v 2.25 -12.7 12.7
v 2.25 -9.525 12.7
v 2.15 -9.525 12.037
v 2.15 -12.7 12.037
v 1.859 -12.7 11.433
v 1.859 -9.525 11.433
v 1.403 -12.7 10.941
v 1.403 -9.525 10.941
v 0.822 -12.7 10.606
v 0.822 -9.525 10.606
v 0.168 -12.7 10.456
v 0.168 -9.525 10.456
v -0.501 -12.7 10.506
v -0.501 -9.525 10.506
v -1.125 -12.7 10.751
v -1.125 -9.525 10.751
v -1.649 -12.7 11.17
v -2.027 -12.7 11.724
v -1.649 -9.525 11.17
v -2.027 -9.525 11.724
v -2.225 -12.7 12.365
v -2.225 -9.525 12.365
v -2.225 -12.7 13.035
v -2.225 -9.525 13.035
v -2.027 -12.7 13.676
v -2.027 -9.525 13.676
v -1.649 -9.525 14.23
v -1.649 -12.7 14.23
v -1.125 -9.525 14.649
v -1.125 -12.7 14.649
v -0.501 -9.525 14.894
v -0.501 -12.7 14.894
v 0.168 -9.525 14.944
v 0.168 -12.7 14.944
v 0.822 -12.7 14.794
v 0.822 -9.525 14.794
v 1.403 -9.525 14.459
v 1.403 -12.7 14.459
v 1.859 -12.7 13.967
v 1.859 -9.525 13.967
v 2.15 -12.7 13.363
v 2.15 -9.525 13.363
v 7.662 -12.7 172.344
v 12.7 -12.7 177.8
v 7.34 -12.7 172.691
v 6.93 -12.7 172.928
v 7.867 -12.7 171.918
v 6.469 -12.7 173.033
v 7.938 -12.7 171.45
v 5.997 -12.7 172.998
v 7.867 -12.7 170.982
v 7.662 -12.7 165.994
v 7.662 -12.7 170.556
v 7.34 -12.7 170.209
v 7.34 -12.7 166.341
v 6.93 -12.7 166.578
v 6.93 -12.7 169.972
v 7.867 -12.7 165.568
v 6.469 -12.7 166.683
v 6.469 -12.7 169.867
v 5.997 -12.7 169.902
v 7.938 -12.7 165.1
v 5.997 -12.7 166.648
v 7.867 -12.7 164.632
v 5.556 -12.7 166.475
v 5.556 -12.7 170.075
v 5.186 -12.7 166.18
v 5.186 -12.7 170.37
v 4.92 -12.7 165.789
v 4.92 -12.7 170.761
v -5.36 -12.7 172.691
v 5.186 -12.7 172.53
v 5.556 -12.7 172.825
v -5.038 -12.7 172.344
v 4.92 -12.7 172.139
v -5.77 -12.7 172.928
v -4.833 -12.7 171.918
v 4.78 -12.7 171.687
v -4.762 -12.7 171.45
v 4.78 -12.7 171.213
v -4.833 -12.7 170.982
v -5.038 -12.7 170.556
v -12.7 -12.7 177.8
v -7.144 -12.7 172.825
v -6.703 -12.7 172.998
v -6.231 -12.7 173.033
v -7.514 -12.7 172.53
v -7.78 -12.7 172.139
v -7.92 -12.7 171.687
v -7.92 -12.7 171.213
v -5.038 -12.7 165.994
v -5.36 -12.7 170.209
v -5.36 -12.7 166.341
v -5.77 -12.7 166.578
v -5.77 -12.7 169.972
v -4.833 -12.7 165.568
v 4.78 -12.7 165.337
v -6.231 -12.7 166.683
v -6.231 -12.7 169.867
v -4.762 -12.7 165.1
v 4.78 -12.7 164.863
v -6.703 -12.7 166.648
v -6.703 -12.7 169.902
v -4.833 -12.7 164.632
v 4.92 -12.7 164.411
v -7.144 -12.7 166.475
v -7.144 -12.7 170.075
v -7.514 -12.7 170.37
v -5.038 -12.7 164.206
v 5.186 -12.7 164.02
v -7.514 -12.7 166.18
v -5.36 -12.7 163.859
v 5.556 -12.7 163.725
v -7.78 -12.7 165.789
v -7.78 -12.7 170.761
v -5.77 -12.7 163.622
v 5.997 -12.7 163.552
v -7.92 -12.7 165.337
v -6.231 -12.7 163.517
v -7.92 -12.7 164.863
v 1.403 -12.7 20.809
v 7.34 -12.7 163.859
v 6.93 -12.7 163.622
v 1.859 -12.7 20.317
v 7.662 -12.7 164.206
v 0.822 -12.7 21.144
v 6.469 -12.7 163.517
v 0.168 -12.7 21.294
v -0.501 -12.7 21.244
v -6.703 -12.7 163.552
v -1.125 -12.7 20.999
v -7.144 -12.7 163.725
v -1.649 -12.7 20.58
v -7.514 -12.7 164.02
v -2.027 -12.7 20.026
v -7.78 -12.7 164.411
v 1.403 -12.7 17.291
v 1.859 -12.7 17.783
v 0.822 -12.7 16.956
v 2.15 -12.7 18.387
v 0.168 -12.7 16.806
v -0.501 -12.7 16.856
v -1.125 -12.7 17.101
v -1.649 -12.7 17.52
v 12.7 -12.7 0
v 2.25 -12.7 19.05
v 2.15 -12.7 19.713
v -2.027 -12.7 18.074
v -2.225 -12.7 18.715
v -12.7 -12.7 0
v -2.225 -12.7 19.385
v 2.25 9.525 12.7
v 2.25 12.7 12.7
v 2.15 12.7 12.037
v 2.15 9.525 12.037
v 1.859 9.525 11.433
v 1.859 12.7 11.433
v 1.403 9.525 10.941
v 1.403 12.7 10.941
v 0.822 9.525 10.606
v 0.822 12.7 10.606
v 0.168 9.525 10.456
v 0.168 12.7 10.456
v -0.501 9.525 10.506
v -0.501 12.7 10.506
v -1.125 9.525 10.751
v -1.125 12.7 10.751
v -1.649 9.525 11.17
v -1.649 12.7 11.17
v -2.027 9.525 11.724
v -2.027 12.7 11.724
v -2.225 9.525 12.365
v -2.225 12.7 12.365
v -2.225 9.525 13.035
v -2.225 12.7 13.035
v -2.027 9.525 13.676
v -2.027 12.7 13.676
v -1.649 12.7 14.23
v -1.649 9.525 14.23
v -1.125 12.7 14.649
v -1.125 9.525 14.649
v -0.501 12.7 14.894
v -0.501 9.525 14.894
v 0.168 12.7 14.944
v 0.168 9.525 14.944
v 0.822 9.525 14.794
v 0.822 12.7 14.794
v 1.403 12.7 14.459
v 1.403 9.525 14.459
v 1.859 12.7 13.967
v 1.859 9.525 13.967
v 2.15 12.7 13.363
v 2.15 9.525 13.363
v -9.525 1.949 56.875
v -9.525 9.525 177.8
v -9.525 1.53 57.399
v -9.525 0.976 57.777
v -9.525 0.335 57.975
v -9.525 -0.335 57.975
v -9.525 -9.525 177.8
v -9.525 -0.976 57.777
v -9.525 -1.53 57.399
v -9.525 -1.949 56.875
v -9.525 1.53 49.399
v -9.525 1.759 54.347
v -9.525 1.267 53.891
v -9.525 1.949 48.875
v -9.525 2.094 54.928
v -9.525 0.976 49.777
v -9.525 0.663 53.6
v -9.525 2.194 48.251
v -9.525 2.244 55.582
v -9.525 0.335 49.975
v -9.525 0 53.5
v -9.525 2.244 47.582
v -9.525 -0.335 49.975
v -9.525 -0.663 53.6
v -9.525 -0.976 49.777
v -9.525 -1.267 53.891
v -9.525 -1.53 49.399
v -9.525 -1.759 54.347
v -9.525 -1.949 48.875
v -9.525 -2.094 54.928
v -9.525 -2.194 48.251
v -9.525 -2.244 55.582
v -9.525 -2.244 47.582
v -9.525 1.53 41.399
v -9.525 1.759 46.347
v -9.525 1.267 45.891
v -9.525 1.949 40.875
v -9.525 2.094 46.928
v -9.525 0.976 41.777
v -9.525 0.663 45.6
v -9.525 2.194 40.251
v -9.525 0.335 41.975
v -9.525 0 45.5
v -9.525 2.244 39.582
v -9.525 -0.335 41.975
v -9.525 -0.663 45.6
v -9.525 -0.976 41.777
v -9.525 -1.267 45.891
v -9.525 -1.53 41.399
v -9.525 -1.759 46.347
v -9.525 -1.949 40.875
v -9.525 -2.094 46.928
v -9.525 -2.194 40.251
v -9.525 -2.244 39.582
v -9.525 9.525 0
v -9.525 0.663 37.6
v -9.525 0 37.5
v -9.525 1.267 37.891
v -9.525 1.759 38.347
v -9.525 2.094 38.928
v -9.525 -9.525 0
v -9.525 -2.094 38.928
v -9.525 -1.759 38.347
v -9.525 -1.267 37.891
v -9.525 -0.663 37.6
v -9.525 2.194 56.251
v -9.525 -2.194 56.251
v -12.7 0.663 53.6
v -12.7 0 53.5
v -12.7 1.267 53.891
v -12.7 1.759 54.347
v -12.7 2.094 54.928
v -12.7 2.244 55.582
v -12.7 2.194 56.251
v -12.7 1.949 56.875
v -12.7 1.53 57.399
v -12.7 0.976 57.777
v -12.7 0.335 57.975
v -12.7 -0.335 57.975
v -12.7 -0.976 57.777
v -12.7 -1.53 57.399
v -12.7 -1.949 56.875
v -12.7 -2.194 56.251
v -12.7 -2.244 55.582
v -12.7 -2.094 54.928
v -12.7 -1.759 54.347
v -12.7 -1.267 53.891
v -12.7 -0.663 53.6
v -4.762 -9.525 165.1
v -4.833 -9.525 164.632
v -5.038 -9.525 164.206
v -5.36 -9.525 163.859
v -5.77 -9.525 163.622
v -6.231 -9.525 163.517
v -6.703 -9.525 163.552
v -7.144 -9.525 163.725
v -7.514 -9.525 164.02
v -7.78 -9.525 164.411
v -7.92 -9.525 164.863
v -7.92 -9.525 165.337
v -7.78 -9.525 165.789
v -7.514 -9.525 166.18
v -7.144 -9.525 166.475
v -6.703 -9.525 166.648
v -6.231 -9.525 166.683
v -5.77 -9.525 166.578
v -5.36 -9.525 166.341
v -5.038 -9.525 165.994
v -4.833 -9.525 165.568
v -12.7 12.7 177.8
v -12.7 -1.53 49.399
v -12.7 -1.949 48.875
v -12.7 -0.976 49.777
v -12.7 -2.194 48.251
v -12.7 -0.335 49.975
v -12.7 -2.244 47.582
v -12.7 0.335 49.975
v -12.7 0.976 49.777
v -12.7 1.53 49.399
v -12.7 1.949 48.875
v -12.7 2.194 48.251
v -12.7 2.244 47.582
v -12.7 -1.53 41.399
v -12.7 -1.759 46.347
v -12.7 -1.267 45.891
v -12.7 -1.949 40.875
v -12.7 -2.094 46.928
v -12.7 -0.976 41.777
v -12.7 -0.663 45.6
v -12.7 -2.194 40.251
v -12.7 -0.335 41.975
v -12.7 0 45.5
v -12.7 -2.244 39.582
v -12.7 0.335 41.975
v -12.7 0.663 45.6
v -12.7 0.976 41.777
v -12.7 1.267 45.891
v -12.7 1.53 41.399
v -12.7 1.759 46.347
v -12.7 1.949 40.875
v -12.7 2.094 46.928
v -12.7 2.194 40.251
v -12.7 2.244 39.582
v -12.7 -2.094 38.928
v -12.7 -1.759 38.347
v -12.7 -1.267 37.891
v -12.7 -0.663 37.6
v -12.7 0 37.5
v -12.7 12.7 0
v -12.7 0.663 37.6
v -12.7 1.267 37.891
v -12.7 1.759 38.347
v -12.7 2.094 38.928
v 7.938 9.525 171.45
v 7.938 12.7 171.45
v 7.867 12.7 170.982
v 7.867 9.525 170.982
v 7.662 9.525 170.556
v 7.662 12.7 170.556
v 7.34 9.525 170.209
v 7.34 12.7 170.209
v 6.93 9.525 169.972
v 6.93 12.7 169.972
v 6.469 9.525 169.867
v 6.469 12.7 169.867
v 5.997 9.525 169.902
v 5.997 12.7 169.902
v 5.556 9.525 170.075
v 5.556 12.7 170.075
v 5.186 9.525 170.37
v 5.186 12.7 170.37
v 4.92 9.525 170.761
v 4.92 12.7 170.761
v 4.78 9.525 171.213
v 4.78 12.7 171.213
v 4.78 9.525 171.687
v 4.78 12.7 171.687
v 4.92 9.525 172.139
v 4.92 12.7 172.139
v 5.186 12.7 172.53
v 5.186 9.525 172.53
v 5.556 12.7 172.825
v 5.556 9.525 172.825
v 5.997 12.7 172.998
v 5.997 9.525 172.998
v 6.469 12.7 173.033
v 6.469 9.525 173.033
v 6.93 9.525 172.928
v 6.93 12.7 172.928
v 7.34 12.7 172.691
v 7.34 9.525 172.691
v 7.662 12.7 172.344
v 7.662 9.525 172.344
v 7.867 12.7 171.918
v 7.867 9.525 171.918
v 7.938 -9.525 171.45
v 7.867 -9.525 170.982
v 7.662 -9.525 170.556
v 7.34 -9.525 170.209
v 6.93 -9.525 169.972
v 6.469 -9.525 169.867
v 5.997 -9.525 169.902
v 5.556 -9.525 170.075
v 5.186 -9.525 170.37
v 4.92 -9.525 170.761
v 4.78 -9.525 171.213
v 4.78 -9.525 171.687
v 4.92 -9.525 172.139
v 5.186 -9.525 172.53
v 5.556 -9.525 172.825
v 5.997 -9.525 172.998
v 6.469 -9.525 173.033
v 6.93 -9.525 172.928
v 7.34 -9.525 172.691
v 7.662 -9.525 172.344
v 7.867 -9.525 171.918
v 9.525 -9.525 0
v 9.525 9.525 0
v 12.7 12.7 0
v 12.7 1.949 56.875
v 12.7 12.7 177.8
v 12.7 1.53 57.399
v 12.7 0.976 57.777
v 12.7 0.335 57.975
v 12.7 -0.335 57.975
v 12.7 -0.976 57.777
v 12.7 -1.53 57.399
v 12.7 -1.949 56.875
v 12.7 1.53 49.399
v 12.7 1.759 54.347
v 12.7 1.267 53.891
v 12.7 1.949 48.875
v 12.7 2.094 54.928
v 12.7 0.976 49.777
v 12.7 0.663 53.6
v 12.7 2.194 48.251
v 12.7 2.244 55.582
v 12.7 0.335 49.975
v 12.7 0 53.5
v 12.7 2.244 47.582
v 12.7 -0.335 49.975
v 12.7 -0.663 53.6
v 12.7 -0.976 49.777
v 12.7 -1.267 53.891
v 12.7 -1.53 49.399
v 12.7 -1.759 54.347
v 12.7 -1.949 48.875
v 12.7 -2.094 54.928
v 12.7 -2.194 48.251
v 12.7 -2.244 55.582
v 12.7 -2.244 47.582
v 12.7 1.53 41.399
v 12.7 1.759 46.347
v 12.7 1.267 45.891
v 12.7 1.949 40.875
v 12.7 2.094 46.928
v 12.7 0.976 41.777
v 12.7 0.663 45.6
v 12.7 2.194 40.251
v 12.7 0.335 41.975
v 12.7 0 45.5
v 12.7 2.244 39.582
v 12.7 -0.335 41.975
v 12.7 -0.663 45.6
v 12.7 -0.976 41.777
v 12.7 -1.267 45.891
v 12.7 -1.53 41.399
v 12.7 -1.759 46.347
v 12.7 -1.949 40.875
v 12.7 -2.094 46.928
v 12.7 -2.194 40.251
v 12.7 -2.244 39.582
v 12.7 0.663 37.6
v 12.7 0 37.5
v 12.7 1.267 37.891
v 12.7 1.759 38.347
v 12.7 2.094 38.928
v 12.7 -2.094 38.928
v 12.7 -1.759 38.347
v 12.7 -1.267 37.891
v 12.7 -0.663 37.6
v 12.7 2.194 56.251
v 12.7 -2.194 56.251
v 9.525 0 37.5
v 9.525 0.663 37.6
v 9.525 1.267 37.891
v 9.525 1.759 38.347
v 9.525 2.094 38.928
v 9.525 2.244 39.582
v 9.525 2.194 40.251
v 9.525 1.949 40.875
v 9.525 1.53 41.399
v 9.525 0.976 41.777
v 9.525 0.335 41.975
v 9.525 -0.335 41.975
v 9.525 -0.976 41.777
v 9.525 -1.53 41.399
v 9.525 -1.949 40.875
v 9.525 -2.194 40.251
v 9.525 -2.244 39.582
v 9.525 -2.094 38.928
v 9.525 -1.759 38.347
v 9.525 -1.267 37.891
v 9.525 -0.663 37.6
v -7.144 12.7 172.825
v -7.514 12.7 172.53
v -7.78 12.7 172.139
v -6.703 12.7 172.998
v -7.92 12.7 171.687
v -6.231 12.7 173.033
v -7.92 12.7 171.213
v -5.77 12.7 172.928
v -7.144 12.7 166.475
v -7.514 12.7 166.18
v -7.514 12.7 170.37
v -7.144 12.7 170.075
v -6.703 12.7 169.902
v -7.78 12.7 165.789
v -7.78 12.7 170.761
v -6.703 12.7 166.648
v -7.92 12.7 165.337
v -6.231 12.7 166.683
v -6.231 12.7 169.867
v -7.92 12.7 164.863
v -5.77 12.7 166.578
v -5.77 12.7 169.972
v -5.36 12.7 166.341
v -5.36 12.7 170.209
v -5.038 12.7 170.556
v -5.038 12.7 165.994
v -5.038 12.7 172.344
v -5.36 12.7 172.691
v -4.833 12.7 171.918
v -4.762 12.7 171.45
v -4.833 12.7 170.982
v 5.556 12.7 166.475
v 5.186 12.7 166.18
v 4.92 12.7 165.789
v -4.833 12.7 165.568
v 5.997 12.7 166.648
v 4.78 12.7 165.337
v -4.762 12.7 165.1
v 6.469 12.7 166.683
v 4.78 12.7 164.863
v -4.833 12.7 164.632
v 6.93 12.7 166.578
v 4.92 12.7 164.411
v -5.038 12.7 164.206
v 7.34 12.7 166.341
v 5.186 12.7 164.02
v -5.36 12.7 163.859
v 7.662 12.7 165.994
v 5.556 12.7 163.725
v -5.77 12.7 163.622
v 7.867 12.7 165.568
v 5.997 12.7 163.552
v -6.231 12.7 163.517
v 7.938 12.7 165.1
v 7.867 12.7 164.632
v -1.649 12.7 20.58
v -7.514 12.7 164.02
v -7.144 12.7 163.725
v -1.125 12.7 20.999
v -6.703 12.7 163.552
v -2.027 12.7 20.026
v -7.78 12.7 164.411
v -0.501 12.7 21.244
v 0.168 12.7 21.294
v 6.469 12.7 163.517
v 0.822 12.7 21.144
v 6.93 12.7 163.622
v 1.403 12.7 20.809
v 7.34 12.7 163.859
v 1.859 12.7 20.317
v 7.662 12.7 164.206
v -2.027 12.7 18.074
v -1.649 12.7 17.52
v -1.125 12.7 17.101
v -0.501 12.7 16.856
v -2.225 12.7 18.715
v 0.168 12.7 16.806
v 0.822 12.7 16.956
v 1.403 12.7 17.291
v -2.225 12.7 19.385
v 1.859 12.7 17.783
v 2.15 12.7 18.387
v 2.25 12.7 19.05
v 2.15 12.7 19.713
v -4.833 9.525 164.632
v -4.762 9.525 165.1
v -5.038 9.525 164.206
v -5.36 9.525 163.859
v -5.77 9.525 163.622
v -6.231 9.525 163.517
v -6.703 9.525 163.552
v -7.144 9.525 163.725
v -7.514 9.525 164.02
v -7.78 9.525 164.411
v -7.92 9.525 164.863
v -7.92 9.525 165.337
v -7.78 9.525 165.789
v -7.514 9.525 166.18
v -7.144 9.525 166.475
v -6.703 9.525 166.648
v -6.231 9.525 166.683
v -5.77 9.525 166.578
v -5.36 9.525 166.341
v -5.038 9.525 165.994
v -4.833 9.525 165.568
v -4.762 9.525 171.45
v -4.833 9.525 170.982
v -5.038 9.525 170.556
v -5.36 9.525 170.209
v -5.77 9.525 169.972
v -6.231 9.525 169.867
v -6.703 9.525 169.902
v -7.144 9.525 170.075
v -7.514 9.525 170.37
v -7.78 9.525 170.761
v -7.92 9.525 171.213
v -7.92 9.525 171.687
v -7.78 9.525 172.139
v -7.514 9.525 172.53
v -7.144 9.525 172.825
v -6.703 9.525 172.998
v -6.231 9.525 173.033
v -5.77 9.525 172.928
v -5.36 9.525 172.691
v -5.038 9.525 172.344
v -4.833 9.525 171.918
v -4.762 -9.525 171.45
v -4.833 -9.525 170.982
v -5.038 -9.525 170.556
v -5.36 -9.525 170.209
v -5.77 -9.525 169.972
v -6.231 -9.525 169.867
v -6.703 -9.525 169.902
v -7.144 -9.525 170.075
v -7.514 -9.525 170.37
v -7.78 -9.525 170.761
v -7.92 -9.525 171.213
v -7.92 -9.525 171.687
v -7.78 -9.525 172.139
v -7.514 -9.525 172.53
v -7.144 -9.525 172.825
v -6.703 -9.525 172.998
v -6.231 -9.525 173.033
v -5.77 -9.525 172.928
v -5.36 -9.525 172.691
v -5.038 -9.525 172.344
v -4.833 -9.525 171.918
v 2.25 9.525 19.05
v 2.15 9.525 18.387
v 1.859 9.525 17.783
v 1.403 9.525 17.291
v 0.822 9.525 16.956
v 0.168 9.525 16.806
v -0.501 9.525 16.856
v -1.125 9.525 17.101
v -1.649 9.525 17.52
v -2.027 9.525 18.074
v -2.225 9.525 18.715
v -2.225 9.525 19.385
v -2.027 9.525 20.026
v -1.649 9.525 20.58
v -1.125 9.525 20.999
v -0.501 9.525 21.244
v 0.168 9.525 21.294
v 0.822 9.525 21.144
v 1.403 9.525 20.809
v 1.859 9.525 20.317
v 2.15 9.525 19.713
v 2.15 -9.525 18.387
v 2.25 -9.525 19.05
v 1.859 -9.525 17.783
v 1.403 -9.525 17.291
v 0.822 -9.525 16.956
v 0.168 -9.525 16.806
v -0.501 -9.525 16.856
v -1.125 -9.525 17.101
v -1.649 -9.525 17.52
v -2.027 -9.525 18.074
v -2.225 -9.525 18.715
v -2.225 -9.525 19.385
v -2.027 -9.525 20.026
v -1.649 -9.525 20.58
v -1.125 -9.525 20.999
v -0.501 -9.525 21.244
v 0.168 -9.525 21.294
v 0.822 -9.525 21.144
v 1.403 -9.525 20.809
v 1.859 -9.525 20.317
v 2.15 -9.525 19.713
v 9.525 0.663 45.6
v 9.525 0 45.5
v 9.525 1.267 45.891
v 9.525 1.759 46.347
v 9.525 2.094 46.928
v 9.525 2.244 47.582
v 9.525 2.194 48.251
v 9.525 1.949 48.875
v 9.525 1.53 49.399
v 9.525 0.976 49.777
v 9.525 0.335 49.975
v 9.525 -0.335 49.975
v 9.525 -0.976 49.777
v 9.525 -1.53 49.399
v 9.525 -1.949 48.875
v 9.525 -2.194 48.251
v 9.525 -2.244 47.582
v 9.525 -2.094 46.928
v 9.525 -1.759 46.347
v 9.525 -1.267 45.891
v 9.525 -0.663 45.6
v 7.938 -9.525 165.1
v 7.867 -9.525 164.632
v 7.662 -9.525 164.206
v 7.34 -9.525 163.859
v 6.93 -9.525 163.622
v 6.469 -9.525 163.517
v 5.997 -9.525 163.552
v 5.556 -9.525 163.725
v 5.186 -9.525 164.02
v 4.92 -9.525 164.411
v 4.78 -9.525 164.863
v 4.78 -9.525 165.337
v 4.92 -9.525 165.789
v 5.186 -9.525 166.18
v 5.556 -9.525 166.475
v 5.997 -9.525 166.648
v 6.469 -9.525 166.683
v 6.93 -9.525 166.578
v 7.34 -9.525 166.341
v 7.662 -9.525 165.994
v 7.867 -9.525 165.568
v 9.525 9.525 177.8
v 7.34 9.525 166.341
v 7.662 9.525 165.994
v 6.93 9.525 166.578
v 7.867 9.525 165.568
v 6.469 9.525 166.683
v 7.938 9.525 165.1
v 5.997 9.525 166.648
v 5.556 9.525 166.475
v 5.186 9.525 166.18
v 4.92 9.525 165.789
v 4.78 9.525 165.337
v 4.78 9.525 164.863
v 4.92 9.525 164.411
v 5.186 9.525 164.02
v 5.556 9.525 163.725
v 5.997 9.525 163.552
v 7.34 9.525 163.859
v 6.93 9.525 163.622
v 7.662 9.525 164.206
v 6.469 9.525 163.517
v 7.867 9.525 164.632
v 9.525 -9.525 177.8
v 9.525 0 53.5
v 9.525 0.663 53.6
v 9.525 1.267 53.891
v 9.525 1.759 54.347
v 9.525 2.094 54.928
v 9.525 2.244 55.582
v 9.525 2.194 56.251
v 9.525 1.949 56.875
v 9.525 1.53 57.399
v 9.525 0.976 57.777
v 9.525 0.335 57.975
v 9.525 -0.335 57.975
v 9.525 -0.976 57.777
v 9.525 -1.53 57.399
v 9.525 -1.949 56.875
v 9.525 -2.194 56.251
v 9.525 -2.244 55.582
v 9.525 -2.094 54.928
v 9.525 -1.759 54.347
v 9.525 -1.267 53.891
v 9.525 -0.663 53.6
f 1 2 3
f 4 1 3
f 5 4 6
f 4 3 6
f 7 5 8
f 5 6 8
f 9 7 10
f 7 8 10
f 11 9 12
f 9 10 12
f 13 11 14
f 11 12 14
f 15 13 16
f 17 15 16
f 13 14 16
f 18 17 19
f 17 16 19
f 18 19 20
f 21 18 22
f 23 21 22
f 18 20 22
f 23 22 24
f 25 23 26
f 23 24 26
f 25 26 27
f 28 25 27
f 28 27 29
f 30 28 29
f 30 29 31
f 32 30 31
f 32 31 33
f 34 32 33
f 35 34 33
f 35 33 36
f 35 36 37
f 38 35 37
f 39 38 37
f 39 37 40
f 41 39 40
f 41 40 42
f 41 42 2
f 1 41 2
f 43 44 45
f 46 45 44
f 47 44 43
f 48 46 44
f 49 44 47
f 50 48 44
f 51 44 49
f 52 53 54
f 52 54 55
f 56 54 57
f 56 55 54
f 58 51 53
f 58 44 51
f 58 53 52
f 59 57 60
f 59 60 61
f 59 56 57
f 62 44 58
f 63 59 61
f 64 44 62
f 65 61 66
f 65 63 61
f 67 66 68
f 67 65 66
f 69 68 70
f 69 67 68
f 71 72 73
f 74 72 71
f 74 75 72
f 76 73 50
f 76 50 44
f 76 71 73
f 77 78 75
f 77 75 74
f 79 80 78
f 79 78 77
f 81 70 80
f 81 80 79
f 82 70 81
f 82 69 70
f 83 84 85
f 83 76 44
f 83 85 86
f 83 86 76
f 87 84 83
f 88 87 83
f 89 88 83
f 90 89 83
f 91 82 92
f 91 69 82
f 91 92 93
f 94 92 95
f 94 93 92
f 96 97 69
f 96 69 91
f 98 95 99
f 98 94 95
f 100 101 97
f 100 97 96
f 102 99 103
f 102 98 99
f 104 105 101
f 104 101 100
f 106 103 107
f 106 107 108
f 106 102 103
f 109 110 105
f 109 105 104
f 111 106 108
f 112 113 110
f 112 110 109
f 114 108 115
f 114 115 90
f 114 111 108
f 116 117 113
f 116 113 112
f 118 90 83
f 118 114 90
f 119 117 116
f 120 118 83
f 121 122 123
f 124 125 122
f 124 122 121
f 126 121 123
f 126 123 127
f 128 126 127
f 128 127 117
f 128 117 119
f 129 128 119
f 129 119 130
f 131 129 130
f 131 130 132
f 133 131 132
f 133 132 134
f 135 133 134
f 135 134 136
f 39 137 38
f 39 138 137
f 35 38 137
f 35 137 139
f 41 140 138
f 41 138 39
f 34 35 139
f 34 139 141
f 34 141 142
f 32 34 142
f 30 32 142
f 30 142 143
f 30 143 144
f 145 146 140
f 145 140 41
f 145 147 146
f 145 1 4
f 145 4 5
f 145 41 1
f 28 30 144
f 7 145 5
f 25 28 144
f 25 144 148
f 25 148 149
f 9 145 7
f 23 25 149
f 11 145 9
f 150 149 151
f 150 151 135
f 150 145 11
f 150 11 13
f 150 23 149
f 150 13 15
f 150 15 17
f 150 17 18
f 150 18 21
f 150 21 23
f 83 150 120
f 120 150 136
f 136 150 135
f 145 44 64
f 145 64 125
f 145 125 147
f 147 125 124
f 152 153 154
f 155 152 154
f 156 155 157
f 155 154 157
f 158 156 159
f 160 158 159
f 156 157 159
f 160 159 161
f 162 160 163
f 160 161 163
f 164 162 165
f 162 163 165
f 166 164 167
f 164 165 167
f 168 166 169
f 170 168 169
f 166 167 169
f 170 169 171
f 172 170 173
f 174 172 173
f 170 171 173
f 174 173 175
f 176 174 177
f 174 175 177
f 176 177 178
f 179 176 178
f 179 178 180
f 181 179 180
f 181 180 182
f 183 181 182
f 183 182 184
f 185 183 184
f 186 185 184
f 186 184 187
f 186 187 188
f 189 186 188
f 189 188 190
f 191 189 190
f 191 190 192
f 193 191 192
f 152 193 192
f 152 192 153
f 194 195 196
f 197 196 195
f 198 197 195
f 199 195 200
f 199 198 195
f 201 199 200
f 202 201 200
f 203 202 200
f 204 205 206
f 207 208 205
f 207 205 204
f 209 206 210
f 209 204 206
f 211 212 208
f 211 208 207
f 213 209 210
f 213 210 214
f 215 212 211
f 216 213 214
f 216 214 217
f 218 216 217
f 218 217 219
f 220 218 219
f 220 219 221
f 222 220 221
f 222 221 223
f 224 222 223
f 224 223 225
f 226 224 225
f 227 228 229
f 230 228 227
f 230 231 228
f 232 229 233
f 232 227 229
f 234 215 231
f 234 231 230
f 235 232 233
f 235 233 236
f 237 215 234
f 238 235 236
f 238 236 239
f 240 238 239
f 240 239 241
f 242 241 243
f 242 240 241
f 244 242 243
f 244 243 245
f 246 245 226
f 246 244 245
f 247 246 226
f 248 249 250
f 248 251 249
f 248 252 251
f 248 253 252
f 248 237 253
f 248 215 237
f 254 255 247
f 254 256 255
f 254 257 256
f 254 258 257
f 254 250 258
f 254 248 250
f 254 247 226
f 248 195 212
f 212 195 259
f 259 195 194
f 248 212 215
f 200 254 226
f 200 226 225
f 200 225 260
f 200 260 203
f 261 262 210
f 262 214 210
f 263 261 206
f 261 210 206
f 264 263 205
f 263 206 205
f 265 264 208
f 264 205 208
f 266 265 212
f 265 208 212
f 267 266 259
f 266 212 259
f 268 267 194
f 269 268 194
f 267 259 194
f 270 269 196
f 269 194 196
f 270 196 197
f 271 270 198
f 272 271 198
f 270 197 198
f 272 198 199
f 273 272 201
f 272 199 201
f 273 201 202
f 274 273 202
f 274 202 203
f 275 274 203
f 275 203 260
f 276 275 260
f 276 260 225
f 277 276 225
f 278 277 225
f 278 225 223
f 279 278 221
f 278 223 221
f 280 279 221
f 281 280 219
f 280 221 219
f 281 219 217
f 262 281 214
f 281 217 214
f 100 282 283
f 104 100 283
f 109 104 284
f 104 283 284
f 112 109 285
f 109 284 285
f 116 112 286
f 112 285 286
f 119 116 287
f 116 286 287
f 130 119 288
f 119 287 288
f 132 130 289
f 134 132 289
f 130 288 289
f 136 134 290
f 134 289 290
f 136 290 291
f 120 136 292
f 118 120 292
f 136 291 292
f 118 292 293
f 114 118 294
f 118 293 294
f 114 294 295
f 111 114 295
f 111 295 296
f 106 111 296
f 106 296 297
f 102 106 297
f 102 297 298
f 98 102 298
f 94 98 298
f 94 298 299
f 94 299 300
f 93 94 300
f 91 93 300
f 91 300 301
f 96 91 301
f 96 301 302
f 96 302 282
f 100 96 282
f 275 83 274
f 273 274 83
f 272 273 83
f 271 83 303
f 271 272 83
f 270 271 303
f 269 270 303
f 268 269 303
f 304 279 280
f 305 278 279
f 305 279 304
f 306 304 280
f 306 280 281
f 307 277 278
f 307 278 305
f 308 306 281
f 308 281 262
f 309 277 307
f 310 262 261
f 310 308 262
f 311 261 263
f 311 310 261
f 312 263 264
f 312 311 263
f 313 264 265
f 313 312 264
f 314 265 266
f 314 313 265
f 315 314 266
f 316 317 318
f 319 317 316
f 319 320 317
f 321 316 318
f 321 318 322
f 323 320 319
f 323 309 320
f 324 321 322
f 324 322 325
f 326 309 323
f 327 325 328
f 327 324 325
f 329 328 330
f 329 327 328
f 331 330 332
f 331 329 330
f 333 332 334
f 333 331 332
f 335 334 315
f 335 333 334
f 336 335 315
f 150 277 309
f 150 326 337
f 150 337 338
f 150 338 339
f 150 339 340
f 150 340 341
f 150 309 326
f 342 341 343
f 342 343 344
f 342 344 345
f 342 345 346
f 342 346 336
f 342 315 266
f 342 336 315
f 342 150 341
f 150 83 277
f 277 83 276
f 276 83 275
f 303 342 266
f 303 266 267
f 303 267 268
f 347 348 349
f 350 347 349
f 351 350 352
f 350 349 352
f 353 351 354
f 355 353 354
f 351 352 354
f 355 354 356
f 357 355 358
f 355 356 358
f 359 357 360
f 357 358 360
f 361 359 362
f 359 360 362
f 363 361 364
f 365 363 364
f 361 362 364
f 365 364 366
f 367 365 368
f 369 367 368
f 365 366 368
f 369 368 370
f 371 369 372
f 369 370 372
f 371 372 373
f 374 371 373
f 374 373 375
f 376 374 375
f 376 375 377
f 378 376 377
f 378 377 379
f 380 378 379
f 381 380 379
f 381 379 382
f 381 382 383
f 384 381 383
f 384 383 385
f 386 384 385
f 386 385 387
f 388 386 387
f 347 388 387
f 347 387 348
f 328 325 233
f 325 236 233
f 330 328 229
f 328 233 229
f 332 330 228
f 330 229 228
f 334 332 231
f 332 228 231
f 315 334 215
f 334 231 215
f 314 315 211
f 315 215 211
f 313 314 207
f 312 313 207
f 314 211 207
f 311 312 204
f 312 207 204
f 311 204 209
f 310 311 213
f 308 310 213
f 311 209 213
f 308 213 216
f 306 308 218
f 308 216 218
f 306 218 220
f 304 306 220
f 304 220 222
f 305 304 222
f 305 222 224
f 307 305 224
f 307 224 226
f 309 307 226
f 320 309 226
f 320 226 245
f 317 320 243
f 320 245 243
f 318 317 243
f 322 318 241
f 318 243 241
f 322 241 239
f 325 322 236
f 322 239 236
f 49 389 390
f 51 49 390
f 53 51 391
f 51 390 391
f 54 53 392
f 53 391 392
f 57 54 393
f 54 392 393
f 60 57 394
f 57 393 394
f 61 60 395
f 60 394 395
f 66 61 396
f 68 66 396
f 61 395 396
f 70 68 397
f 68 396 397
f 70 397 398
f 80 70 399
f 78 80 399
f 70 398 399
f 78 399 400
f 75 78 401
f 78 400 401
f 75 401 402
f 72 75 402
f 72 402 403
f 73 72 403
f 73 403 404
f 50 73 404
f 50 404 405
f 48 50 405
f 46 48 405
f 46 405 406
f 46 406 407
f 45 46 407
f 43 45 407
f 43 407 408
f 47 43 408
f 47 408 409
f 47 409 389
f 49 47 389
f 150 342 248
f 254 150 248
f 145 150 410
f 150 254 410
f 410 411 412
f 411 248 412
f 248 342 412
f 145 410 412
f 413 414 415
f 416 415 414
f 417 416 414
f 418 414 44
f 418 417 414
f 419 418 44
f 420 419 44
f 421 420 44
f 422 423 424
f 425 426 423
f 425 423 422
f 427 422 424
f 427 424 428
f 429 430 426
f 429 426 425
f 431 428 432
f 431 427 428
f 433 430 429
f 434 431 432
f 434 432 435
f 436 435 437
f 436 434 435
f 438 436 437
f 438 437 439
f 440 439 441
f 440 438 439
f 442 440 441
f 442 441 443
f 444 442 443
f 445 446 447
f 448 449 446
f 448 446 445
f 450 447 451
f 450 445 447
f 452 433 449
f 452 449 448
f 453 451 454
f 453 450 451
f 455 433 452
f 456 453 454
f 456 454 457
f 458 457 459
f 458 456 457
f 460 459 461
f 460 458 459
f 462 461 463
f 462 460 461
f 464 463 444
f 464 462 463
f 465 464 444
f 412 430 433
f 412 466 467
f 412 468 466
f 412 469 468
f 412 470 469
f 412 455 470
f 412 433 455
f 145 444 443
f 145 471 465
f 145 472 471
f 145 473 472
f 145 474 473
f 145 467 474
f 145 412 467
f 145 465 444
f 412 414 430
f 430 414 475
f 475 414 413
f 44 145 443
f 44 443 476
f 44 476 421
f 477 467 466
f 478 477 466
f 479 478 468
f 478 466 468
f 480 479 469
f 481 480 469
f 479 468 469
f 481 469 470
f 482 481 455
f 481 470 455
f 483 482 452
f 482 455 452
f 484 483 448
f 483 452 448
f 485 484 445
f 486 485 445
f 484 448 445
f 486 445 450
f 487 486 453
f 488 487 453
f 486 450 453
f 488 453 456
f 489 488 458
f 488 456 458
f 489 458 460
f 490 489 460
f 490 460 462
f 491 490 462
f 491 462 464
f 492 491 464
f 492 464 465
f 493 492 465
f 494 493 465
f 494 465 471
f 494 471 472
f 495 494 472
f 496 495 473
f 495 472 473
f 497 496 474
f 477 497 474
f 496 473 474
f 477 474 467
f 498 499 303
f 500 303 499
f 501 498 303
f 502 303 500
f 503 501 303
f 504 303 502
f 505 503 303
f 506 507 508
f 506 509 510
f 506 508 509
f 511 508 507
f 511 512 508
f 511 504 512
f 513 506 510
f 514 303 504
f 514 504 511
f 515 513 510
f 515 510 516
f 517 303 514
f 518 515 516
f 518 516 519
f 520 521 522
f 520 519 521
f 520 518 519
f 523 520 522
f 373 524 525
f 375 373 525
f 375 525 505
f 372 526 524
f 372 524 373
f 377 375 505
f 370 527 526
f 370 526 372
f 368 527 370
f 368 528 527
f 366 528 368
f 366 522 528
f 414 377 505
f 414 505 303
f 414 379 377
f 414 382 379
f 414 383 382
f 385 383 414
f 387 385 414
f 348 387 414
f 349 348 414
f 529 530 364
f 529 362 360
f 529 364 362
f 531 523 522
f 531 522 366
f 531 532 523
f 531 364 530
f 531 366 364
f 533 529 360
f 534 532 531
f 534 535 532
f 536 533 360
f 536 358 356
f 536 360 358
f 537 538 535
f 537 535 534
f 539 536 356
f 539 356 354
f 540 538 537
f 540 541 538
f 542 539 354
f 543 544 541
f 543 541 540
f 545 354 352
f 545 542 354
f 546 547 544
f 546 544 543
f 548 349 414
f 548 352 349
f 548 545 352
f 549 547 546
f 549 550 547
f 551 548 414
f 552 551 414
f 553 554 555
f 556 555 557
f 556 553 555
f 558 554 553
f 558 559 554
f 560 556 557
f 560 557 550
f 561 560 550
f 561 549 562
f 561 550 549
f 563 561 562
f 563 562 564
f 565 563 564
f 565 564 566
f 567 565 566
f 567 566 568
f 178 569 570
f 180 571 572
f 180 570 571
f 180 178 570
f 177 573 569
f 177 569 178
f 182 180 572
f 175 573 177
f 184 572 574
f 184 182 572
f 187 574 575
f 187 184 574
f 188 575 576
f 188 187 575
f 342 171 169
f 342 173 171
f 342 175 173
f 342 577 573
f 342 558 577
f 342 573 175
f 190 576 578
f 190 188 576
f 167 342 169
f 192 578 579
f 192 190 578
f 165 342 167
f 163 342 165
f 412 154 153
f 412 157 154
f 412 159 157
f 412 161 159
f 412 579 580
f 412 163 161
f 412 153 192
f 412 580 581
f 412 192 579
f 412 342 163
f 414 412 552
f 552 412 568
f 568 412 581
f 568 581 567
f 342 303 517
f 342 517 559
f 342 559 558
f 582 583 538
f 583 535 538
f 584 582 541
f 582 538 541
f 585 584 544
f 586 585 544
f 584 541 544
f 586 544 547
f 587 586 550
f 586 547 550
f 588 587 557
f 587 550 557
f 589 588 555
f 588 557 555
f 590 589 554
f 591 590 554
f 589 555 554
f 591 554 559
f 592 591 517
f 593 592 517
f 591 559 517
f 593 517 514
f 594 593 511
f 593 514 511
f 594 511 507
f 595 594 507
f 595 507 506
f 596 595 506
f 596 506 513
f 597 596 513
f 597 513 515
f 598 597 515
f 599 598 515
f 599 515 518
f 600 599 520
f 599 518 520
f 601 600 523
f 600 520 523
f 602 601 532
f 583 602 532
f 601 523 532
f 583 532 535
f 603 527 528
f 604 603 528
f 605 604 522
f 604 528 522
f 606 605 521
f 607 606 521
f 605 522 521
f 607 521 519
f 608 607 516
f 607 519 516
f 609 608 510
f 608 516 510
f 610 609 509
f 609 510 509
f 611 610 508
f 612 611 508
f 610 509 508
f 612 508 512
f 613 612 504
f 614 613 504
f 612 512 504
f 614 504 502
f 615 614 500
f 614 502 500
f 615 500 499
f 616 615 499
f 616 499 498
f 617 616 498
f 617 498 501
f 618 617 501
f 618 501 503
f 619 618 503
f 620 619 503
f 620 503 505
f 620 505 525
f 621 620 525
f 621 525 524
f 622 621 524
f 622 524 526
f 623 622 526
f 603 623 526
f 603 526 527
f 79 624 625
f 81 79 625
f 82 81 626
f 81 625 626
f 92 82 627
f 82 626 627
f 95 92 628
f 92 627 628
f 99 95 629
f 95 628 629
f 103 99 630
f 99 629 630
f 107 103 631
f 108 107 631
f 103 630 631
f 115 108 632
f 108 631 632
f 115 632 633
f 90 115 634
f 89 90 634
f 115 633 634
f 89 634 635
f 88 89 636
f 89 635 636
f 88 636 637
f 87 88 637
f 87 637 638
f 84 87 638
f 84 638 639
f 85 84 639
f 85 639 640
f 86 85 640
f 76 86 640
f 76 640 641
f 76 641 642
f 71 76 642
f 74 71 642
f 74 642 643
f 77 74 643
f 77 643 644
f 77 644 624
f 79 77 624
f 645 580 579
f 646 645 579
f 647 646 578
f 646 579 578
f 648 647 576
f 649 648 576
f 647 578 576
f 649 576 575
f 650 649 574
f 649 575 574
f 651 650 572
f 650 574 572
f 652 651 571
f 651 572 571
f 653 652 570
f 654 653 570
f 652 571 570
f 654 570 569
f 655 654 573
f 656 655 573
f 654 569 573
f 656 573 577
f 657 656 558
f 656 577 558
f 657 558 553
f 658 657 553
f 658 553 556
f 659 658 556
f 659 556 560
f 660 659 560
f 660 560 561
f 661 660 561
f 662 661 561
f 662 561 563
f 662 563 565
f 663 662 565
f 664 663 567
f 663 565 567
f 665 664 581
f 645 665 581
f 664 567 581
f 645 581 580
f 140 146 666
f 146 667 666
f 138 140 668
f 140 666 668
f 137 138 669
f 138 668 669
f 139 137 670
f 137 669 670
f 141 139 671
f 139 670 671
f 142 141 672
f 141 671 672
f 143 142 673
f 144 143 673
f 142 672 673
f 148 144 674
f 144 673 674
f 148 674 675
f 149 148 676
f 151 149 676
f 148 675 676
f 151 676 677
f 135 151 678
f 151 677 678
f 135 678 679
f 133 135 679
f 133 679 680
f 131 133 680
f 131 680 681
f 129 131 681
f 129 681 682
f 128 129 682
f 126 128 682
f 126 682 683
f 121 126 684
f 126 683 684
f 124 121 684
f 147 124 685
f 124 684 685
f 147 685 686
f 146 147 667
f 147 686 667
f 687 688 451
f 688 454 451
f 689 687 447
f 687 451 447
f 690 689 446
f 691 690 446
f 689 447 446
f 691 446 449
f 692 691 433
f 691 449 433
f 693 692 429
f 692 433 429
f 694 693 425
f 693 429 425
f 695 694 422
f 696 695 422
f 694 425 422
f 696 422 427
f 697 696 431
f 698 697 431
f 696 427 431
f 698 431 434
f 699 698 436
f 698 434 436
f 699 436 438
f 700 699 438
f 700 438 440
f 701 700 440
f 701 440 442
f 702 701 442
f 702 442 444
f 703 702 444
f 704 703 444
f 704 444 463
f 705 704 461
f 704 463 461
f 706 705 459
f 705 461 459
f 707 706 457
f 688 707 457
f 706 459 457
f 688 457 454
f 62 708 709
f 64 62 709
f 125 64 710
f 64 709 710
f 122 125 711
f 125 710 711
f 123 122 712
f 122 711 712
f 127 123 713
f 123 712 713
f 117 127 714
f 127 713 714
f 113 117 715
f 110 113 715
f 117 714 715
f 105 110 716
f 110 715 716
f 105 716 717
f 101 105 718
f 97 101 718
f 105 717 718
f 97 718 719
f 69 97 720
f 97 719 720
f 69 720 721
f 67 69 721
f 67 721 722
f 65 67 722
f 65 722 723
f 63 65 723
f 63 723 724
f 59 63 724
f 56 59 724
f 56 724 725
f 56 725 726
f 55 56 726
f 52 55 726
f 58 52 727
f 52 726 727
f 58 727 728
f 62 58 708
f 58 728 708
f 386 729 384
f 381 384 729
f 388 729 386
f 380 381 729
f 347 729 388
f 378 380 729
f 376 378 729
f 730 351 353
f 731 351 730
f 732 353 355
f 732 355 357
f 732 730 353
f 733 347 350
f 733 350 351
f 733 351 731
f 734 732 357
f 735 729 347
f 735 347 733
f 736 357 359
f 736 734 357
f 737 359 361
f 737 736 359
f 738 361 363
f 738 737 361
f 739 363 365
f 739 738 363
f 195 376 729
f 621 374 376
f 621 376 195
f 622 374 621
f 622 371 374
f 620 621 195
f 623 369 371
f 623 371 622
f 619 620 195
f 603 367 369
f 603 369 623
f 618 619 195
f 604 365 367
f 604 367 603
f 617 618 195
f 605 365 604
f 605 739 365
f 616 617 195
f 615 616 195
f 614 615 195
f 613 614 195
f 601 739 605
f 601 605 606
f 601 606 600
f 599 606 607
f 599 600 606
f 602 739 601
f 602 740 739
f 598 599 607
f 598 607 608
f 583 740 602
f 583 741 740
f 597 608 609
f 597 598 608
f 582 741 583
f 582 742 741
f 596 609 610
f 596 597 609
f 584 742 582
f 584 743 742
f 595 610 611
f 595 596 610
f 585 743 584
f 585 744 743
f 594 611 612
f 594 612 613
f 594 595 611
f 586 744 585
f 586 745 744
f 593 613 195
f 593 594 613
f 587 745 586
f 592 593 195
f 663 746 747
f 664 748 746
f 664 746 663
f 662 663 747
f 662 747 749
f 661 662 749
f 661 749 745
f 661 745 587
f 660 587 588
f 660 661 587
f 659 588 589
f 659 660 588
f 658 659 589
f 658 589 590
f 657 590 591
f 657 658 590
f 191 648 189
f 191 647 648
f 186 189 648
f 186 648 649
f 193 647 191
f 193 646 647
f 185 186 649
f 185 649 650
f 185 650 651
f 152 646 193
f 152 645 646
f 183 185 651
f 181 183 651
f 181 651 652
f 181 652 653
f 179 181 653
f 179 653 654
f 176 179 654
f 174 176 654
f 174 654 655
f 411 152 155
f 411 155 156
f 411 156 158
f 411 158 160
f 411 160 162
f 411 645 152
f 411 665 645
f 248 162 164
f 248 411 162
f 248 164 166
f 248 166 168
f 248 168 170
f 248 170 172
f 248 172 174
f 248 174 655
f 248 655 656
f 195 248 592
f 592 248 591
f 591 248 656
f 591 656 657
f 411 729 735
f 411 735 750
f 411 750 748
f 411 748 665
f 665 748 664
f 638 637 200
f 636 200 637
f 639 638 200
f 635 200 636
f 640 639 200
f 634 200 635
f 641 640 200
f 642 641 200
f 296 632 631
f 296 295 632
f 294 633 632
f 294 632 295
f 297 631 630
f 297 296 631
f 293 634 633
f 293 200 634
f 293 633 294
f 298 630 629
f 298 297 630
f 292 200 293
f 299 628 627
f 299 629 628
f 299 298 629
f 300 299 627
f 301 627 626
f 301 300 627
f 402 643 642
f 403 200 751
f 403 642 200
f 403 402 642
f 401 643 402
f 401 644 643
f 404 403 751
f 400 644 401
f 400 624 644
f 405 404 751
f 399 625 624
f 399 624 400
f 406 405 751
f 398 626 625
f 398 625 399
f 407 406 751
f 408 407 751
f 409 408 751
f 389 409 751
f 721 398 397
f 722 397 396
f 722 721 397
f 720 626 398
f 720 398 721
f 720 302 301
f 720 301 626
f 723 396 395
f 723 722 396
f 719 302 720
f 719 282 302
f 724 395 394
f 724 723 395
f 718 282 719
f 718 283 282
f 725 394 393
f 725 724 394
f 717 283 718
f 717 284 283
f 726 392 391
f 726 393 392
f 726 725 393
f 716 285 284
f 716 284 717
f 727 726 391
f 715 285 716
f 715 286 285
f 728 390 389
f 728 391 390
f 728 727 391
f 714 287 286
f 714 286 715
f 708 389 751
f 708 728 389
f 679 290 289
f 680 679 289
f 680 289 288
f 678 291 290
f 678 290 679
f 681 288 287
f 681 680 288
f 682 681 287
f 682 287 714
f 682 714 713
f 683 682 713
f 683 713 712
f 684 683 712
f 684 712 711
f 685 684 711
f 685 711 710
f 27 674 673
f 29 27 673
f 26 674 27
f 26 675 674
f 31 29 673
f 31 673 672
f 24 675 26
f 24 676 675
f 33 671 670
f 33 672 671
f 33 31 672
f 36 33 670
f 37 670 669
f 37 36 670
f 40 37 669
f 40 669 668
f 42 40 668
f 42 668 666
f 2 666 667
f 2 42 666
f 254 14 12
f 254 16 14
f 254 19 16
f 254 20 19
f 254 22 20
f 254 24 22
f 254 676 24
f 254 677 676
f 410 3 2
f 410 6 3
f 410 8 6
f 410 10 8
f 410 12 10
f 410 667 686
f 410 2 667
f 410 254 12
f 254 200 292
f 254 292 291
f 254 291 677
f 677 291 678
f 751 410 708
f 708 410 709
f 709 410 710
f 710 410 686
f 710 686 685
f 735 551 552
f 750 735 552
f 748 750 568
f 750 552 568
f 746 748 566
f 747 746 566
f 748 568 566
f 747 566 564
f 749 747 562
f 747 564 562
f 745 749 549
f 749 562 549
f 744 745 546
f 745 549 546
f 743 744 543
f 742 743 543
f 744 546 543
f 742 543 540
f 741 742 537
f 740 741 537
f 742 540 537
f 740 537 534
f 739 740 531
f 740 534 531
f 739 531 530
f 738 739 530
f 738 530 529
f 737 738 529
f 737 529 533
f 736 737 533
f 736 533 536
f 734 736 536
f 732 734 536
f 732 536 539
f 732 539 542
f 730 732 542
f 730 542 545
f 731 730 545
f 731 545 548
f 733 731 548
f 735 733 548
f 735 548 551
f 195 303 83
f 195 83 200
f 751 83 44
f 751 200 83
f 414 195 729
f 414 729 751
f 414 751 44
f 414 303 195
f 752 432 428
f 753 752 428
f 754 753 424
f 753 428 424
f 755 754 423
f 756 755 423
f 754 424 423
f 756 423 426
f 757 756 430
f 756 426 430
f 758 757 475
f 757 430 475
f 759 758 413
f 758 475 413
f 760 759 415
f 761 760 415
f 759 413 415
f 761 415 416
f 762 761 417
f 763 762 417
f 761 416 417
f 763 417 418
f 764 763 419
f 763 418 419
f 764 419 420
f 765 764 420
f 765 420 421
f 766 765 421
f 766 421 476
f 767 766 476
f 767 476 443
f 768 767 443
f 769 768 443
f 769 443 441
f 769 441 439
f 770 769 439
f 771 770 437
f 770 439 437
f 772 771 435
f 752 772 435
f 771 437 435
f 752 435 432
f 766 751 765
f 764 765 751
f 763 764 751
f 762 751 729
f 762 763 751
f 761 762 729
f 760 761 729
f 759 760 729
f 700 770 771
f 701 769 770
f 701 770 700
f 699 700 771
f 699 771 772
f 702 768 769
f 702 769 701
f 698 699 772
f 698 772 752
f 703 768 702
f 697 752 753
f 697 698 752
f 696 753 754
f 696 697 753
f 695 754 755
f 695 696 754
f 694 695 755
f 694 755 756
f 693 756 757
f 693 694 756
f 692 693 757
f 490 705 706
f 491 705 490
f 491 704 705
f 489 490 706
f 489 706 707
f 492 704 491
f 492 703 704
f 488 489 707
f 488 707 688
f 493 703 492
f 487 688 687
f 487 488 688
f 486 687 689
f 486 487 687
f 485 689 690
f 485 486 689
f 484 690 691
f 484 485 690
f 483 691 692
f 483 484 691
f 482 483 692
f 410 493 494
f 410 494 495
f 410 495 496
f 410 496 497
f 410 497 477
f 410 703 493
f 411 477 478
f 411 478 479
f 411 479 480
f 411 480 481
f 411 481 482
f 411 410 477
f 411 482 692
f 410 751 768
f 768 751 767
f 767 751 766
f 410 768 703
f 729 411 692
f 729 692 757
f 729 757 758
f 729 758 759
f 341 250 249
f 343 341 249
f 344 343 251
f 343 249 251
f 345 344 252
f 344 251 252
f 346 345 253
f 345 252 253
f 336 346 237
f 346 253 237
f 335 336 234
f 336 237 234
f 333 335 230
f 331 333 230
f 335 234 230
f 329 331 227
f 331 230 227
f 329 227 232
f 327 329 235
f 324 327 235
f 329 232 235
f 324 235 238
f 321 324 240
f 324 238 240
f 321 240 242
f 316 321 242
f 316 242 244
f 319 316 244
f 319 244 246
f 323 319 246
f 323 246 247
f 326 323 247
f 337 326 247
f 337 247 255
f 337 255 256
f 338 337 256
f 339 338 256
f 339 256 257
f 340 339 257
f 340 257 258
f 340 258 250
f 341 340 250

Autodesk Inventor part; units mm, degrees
ref_plane "YZ Plane" through (0, 0, 0) normal (1, 0, 0) x (0, 1, 0)
ref_plane "XZ Plane" through (0, 0, 0) normal (0, 1, 0) x (-1, 0, 0)
ref_plane "XY Plane" through (0, 0, 0) normal (0, 0, 1) x (1, 0, 0)
sketch "Sketch1" plane through (0, 0, 0) normal (0, 0, 1) x (1, 0, 0)
  line L0 (12.7, -12.7) -> (-12.7, -12.7)
  line L1 (-12.7, -12.7) -> (-12.7, 12.7)
  line L2 (-12.7, 12.7) -> (12.7, 12.7)
  line L3 (12.7, 12.7) -> (12.7, -12.7)
  line L4 (12.7, -12.7) -> (-12.7, 12.7) construction
  line L5 (-12.7, -12.7) -> (12.7, 12.7) construction
  line L6 (9.525, 9.525) -> (-9.525, 9.525)
  line L7 (-9.525, 9.525) -> (-9.525, -9.525)
  line L8 (-9.525, -9.525) -> (9.525, -9.525)
  line L9 (9.525, -9.525) -> (9.525, 9.525)
  point P0 (0, 0)
  dimension "d0" = 25.4
  dimension "d1" = 25.4
  dimension "d2" = 3.175
extrude "Extrusion1" add sketch "Sketch1" along normal blind 177.8
sketch "Sketch2" plane through (12.7, -12.7, 0) normal (1, 0, 0) x (0, 0, -1)
  line L0 (0, 0) -> (0, 25.4) construction
  line L1 (0, 25.4) -> (-177.8, 25.4) construction
  line L2 (-177.8, 0) -> (-177.8, 25.4) construction
  line L3 (0, 0) -> (-177.8, 0) construction
  line L4 (-177.8, 22.225) -> (-177.8, 3.175) construction
  line L5 (-177.8, 12.7) -> (0, 12.7) construction
  line L6 (-31.75, 25.4) -> (-31.75, 0) construction
  circle A0 centre (-39.75, 12.7) radius 2.25
  circle A1 centre (-47.75, 12.7) radius 2.25
  circle A2 centre (-55.75, 12.7) radius 2.25
  dimension "d5" = 31.75
  dimension "d6" = 4.5
  dimension "d7" = 8
  dimension "d8" = 4.5
  dimension "d9" = 8
  dimension "d10" = 4.5
  dimension "d11" = 8
extrude "Extrusion2" cut sketch "Sketch2" against normal through all
sketch "Sketch3" plane through (-12.7, 12.7, 0) normal (0, 1, 0) x (1, 0, 0)
  line L0 (12.7, 0) -> (12.7, -177.7213) construction
  circle A0 centre (12.7, -12.7) radius 2.25
  circle A1 centre (12.7, -19.05) radius 2.25
  line L1 (25.4, 0) -> (0, 0) projected
  dimension "d14" = 4.5
  dimension "d15" = 4.5
  dimension "d16" = 12.7
  dimension "d17" = 6.35
extrude "Extrusion3" cut sketch "Sketch3" against normal blind 25.4
sketch "Sketch4" plane through (-12.7, 12.7, 0) normal (0, 1, 0) x (1, 0, 0)
  line L0 (12.7, 0) -> (12.7, -177.8) construction
  line L1 (3.175, -177.8) -> (22.225, -177.8) construction
  circle A0 centre (6.35, -171.45) radius 1.5875
  line L2 (0, 0) -> (0, -177.8) projected
  circle A1 centre (19.05, -171.45) radius 1.5875
  line L3 (25.4, 0) -> (25.4, -177.8) projected
  circle A2 centre (6.35, -165.1) radius 1.5875
  circle A3 centre (19.05, -165.1) radius 1.5875
  dimension "d20" = 3.175
  dimension "d21" = 6.35
  dimension "d22" = 6.35
  dimension "d23" = 3.175
  dimension "d24" = 6.35
  dimension "d25" = 6.35
  dimension "d26" = 3.175
  dimension "d27" = 6.35
  dimension "d28" = 6.35
  dimension "d29" = 3.175
  dimension "d30" = 6.35
  dimension "d31" = 6.35
extrude "Extrusion4" cut sketch "Sketch4" against normal through all
properties part number "CS_Climb_Inner_Tube"
